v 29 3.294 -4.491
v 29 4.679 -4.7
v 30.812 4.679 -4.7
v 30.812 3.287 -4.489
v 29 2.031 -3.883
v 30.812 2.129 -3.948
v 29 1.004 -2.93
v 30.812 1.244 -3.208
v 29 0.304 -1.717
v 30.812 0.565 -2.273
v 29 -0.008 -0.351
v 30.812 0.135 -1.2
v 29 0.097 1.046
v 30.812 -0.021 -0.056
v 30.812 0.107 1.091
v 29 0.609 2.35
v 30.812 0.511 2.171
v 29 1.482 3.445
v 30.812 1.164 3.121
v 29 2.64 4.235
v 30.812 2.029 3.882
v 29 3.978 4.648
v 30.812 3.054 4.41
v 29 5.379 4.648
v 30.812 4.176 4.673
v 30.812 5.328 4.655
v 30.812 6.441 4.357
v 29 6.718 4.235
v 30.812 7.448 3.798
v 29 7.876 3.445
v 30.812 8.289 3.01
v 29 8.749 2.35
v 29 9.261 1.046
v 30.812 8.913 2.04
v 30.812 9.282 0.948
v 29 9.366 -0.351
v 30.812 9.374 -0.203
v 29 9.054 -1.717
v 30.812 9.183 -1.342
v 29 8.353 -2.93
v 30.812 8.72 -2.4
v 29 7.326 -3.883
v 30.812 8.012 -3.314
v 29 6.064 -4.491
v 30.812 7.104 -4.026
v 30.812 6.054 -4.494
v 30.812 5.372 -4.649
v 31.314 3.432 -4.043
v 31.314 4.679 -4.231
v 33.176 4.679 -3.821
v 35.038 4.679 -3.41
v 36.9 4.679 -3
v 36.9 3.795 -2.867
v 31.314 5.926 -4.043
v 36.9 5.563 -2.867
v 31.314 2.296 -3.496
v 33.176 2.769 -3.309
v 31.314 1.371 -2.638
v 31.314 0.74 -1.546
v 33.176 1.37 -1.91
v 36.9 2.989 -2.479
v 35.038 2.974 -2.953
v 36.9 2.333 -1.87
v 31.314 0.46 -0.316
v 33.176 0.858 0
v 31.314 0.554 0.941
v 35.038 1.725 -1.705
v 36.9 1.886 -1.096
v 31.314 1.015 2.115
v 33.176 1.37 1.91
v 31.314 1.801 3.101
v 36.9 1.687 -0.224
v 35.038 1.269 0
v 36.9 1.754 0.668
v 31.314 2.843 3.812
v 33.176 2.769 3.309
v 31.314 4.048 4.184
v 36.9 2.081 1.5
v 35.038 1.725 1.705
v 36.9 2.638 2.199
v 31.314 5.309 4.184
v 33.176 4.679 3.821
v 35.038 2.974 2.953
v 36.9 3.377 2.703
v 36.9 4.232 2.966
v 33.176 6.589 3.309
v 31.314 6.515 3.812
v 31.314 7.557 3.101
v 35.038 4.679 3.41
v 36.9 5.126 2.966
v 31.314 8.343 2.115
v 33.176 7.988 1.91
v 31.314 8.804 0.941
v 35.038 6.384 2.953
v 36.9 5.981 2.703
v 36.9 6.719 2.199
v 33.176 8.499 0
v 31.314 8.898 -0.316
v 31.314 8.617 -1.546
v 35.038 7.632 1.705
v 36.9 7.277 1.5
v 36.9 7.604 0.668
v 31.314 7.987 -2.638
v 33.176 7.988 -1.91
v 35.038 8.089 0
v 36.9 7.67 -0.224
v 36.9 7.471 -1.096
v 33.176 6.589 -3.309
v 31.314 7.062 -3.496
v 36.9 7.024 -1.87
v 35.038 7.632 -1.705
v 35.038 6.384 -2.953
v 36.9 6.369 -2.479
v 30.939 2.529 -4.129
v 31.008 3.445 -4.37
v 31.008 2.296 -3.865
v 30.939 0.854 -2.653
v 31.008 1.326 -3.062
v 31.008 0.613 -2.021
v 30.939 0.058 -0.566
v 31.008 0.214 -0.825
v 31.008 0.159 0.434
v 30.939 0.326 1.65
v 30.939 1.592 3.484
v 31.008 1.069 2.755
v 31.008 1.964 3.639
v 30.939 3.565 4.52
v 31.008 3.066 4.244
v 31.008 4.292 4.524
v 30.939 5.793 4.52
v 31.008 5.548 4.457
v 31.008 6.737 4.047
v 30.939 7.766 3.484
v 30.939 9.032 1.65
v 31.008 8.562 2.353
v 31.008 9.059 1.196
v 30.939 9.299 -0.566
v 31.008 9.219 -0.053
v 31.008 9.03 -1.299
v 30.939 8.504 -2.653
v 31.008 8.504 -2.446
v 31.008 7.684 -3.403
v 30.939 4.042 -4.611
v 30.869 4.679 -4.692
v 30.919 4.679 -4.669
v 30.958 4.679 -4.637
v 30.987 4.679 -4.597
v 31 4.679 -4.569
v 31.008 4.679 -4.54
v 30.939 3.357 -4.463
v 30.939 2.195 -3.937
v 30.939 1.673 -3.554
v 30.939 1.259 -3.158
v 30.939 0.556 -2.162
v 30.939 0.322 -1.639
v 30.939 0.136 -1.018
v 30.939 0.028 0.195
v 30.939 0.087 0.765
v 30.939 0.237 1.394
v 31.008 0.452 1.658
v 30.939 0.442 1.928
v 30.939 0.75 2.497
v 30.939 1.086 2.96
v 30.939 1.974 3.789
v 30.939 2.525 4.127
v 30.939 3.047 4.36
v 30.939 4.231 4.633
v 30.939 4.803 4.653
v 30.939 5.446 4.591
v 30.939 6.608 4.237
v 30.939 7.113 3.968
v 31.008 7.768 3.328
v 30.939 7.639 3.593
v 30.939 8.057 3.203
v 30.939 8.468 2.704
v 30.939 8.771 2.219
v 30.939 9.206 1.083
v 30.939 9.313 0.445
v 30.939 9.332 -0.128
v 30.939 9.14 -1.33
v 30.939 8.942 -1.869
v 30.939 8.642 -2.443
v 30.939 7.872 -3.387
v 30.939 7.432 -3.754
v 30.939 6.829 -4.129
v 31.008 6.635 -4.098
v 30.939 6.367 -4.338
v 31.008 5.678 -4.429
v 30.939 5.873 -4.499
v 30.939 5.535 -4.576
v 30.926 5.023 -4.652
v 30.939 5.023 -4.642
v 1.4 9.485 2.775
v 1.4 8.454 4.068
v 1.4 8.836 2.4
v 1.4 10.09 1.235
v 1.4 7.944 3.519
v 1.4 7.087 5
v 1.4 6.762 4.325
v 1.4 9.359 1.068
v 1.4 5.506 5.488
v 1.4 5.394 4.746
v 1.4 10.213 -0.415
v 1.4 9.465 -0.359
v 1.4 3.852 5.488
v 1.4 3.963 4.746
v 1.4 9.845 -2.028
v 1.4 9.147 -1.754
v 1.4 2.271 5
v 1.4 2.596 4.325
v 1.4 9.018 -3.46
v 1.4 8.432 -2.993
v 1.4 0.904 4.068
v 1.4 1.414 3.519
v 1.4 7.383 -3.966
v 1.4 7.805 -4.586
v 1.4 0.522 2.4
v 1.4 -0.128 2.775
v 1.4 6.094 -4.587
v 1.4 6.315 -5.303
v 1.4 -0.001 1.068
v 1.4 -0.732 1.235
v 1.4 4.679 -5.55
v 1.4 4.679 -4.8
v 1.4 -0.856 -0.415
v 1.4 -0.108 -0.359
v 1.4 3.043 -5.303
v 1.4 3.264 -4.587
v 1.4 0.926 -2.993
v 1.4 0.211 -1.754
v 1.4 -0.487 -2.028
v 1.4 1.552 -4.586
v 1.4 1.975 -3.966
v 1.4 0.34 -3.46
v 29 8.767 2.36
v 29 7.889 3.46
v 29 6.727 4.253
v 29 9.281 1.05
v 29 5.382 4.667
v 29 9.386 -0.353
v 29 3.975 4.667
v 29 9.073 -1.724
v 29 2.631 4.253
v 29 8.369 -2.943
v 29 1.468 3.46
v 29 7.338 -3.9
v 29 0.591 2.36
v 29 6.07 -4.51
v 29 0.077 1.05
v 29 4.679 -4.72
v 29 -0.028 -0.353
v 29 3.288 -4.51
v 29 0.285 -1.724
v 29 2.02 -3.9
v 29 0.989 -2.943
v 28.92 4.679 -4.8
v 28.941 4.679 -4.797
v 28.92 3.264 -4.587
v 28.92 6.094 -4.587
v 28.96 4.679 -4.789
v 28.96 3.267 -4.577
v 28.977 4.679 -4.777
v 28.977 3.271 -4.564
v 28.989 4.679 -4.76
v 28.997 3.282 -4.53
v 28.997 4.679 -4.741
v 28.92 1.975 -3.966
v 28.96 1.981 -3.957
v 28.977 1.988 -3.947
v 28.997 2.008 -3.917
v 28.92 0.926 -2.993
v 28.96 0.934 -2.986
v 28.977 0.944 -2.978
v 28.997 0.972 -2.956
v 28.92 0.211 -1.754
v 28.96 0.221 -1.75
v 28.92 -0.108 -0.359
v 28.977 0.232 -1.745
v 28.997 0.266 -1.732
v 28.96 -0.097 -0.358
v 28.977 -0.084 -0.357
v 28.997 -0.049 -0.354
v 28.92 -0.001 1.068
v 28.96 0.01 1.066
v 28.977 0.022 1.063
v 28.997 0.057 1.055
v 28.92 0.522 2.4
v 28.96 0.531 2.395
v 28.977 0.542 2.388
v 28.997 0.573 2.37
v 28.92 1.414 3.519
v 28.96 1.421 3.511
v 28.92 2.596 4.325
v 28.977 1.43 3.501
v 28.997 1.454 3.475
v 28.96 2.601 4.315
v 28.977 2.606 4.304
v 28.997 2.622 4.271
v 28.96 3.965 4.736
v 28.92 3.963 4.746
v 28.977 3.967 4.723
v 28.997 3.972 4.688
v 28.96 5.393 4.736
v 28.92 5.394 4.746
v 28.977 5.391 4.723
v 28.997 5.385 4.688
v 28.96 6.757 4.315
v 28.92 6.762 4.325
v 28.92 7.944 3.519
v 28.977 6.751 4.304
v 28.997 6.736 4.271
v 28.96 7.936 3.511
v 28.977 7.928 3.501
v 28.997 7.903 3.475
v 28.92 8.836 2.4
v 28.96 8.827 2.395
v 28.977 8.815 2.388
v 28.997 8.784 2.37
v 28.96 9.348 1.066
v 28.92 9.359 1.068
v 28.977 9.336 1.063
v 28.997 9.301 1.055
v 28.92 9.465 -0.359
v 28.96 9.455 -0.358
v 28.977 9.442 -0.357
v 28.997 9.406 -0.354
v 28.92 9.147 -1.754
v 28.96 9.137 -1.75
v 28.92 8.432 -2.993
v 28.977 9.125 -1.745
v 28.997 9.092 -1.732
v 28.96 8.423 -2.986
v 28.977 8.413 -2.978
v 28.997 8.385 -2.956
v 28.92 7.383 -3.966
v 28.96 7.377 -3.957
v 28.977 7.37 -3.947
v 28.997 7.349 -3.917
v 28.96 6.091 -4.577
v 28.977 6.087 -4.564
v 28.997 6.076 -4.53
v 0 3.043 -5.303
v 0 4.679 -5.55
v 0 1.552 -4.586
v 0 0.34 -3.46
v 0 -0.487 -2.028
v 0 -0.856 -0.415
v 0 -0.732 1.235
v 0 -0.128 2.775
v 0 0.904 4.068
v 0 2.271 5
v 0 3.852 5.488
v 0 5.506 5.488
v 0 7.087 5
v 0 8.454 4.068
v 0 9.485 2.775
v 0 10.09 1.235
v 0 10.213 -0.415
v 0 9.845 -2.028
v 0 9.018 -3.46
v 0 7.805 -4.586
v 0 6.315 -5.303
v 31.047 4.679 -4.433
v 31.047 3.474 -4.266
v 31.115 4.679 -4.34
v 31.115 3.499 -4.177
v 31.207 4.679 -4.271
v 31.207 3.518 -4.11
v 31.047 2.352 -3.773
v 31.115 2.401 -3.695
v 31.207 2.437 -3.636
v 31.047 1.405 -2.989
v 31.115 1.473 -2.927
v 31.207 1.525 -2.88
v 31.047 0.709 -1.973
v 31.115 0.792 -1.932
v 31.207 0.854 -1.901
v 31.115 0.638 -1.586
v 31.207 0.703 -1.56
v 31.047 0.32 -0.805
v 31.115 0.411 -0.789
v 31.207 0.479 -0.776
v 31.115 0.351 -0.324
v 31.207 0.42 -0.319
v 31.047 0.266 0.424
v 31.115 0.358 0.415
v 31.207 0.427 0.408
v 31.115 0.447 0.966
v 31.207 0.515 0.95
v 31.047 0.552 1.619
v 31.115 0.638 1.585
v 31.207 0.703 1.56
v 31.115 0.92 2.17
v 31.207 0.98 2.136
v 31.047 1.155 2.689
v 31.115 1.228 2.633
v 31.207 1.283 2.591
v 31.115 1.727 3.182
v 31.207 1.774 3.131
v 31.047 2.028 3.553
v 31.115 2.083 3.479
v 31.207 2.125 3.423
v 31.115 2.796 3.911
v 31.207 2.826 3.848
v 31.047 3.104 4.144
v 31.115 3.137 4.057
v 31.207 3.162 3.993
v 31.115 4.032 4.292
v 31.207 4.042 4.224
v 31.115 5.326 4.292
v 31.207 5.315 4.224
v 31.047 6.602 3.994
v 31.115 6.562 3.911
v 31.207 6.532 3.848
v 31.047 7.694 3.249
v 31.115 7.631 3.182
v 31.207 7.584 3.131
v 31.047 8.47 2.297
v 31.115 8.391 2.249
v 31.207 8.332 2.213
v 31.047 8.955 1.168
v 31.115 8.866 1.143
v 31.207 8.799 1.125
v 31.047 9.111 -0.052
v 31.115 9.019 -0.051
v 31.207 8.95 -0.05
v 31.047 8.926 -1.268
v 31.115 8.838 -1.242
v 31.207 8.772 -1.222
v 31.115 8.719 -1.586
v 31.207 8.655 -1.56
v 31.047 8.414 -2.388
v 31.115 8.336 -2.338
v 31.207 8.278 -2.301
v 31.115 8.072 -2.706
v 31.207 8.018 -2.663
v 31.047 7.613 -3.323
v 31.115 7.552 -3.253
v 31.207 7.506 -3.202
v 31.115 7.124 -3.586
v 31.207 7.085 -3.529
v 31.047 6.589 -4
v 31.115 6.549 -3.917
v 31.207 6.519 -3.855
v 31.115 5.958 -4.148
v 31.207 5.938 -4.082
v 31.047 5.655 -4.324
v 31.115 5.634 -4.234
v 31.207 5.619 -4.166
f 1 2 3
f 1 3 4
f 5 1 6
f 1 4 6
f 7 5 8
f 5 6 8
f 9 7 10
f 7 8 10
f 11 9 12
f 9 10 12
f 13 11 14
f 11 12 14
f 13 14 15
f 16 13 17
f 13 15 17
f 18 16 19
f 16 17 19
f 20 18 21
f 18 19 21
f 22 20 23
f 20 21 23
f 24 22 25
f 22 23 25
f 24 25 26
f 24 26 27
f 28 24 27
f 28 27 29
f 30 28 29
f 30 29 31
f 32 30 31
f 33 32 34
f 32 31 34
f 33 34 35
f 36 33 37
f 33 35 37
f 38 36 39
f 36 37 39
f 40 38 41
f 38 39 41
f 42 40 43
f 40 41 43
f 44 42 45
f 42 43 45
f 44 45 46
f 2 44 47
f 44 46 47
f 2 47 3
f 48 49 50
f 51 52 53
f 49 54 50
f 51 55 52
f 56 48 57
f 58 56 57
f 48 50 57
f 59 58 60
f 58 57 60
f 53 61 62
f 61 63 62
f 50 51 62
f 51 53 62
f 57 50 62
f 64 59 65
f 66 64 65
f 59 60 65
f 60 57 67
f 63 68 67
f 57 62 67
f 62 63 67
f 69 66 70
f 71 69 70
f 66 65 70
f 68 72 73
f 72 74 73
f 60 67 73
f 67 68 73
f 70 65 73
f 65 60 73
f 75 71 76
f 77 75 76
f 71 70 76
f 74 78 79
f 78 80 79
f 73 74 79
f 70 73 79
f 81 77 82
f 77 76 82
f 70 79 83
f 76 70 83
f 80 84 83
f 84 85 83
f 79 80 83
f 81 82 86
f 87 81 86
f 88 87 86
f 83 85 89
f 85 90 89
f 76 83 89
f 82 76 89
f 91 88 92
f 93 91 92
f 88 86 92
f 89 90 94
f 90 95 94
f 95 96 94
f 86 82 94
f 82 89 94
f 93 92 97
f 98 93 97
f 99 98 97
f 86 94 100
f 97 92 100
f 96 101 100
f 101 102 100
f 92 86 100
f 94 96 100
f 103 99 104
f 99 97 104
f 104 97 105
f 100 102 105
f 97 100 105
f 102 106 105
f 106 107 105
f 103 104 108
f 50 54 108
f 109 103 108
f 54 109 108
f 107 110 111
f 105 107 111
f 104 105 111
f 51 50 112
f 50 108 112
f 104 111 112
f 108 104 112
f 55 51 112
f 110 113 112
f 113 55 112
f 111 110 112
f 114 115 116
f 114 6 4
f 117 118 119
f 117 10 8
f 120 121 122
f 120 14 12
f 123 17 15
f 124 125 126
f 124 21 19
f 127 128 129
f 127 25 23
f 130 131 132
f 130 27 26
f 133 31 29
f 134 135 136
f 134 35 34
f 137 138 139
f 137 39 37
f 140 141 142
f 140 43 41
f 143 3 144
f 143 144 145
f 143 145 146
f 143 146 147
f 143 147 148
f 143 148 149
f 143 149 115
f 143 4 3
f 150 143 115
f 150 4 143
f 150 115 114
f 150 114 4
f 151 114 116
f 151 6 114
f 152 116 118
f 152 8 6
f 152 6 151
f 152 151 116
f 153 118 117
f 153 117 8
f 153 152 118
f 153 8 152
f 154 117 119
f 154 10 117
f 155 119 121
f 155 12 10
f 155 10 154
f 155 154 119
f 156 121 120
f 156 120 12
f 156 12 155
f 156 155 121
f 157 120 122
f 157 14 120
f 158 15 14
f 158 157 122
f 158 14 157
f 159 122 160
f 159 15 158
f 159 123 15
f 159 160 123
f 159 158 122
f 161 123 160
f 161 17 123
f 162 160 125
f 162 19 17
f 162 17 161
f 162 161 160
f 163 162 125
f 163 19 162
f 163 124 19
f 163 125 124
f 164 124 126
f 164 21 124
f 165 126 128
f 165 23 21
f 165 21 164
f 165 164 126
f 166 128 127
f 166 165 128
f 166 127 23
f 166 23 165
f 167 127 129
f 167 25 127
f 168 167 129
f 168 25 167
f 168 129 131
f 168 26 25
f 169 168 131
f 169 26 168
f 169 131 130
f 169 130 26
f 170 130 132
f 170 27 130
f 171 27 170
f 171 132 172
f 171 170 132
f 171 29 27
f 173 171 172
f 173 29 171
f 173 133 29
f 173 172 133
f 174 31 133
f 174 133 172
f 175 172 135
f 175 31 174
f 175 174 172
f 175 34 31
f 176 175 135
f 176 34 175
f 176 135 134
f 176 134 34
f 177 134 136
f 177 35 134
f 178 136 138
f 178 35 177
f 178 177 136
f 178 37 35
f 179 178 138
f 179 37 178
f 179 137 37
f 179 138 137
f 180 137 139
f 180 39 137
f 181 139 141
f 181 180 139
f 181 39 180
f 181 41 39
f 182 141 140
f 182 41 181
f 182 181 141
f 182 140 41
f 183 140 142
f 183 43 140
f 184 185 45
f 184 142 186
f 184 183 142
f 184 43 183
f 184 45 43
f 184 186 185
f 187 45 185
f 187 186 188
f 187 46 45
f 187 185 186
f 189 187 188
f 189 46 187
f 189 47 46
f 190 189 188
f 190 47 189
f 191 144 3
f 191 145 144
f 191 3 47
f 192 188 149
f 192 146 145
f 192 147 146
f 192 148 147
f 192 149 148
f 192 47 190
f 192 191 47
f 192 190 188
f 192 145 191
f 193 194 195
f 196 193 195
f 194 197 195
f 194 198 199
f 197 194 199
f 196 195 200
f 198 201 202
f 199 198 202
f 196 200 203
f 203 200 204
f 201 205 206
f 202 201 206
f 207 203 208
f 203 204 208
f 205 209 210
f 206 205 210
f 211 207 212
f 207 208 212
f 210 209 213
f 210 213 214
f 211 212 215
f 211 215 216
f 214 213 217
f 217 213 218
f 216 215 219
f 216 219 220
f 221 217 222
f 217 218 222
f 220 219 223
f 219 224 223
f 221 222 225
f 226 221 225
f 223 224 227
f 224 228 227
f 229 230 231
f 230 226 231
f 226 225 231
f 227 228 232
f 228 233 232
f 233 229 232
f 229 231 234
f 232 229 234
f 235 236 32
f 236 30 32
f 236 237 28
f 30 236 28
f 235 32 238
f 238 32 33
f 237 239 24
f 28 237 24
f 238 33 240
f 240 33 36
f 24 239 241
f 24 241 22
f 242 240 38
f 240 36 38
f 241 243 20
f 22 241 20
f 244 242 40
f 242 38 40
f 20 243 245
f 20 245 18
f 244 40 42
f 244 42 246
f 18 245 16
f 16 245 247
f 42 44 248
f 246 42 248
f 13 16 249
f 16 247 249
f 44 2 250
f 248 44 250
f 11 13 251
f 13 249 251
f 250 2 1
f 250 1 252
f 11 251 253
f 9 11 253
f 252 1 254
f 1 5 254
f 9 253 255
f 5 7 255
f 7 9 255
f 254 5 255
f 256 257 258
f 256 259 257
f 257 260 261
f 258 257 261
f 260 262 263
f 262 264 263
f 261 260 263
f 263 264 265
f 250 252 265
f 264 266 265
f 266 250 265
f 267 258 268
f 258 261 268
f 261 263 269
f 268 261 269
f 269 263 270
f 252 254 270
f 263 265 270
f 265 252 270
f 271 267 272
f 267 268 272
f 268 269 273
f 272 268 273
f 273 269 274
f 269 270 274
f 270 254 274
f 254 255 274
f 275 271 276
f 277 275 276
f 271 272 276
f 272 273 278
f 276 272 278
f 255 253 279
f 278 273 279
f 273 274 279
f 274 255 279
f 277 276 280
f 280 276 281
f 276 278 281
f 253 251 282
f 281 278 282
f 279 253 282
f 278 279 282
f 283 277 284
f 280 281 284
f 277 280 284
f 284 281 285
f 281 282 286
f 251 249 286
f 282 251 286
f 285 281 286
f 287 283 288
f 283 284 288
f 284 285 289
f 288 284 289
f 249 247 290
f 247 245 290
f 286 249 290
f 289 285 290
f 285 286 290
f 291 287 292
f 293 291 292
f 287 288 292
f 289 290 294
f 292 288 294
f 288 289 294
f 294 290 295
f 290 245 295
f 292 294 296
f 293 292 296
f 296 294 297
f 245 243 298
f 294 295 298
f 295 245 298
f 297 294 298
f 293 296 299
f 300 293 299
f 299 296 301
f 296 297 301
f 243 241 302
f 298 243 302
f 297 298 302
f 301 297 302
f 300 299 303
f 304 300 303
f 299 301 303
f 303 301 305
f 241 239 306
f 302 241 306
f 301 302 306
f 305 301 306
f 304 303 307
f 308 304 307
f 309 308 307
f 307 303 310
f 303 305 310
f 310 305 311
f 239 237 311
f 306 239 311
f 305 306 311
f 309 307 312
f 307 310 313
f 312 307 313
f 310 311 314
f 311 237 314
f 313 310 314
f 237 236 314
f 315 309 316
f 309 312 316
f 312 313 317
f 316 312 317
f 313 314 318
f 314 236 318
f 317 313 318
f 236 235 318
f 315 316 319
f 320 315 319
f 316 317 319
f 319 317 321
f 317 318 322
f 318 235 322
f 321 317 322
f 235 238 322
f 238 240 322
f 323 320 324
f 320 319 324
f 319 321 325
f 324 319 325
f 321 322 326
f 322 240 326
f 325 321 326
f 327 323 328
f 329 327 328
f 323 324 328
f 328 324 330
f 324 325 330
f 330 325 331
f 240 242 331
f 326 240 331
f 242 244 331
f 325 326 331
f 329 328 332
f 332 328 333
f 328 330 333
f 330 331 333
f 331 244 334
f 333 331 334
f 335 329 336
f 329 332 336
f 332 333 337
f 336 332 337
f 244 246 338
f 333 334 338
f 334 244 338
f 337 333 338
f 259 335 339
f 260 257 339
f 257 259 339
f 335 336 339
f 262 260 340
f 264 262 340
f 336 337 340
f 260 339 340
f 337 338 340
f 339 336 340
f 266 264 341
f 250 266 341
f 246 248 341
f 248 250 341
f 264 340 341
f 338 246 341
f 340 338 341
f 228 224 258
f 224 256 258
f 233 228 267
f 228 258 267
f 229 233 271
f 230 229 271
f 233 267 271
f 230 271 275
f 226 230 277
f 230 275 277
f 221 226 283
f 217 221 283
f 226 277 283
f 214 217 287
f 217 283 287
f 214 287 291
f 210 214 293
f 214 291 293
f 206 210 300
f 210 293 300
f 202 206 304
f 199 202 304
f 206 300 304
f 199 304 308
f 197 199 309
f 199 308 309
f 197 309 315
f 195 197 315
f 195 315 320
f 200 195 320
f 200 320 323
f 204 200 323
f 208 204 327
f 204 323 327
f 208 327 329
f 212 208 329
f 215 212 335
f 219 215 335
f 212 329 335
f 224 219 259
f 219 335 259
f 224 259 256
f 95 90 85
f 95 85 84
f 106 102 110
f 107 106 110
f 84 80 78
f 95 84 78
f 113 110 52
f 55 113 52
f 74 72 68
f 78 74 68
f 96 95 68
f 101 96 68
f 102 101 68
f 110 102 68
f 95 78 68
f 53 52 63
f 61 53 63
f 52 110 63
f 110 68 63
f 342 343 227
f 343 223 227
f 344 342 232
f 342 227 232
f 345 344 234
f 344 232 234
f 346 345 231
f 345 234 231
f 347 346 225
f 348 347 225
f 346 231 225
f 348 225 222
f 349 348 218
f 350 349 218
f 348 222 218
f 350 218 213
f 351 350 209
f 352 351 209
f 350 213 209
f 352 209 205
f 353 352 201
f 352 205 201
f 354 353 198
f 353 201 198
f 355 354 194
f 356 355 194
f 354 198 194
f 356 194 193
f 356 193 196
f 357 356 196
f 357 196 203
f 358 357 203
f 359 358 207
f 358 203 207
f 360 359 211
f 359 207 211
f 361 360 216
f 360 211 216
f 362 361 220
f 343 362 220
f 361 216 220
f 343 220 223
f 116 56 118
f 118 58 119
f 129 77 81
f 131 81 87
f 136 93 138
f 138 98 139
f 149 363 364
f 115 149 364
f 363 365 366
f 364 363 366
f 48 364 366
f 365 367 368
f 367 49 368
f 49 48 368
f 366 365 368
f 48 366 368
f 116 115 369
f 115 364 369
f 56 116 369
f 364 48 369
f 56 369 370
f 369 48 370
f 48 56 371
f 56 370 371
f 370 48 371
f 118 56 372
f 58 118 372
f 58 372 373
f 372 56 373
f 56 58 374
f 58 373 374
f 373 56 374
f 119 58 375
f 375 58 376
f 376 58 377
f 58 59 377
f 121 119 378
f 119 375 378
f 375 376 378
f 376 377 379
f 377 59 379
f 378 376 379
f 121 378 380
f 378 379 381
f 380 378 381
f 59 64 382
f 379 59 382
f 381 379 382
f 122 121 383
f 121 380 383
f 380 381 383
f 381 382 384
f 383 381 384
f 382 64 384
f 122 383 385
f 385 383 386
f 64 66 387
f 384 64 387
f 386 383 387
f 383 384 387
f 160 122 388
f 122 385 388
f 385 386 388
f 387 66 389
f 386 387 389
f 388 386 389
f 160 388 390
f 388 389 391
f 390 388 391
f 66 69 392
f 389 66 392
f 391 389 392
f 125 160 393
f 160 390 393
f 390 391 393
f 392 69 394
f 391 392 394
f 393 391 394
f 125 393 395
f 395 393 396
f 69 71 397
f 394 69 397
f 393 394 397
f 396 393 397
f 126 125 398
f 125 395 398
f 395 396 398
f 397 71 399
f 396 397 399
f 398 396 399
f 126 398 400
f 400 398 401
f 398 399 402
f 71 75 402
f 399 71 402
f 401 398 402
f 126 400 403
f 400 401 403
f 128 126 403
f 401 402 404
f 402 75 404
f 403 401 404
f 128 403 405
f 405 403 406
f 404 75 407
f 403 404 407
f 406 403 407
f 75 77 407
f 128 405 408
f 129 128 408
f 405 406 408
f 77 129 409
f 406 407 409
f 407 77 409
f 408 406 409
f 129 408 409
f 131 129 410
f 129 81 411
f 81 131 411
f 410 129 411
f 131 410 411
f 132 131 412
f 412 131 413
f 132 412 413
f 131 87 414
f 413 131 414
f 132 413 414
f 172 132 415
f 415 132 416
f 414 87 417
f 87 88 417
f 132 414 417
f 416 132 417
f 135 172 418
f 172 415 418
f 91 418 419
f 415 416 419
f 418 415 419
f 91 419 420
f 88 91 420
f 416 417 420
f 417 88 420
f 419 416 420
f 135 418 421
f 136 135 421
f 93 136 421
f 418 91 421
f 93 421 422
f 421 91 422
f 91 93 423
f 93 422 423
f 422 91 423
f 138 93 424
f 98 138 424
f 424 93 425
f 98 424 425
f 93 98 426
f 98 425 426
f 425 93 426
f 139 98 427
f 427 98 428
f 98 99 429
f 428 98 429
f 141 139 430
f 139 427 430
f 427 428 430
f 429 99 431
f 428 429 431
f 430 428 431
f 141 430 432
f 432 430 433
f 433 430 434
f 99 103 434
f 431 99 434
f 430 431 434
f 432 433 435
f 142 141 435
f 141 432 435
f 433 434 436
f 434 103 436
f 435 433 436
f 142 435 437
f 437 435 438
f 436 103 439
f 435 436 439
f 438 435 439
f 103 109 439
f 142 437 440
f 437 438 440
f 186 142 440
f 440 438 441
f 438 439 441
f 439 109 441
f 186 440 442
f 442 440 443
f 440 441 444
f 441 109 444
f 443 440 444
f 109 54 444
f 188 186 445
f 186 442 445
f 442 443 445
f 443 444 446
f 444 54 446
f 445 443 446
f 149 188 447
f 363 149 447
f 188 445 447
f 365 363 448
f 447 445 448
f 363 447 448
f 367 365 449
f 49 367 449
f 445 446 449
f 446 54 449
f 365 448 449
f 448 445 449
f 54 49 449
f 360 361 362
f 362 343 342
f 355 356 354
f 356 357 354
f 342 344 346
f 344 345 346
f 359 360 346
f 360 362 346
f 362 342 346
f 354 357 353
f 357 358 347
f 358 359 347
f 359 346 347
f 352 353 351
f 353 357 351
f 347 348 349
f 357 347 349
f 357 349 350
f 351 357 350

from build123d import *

# Parameters (mm, degrees)
FILETE1_R = 0.2


with BuildPart() as part:
    # Esboço1 → Revolução1 (revolve)
    with BuildSketch(Plane.XY, mode=Mode.PRIVATE) as revolu_o1_sk:
        with BuildLine():
            Line((0, 4.678862418), (0, 10.228862418))
            Line((0, 10.228862418), (1.4, 10.228862418))
            Line((1.4, 10.228862418), (1.4, 9.478862418))
            Line((1.4, 9.478862418), (28.92, 9.478862418))
            ThreePointArc((28.92, 9.478862418), (28.976568542, 9.455430961), (29, 9.398862418))
            Line((29, 9.398862418), (29, 9.378862418))
            Line((29, 9.378862418), (31, 9.378862418))
            Line((31, 9.378862418), (31, 9.300321604))
            ThreePointArc((31, 9.300321604), (31.088208078, 9.049750661), (31.313928988, 8.909691624))
            Line((31.313928988, 8.909691624), (36.9, 7.678862418))
            Line((36.9, 7.678862418), (36.9, 4.678862418))
            Line((36.9, 4.678862418), (0, 4.678862418))
        make_face()
    revolve(revolu_o1_sk.sketch.rotate(Axis((36.9, 4.678862418, 0), (-1, 0, 0)), 90), axis=Axis((36.9, 4.678862418, 0), (-1, 0, 0)))

    # Filete1
    filete1_edges = [part.edges().sort_by_distance(p)[0] for p in [
        (31, 4.678862418, 4.7),
    ]]
    fillet(filete1_edges, radius=FILETE1_R)


solid = part.part
